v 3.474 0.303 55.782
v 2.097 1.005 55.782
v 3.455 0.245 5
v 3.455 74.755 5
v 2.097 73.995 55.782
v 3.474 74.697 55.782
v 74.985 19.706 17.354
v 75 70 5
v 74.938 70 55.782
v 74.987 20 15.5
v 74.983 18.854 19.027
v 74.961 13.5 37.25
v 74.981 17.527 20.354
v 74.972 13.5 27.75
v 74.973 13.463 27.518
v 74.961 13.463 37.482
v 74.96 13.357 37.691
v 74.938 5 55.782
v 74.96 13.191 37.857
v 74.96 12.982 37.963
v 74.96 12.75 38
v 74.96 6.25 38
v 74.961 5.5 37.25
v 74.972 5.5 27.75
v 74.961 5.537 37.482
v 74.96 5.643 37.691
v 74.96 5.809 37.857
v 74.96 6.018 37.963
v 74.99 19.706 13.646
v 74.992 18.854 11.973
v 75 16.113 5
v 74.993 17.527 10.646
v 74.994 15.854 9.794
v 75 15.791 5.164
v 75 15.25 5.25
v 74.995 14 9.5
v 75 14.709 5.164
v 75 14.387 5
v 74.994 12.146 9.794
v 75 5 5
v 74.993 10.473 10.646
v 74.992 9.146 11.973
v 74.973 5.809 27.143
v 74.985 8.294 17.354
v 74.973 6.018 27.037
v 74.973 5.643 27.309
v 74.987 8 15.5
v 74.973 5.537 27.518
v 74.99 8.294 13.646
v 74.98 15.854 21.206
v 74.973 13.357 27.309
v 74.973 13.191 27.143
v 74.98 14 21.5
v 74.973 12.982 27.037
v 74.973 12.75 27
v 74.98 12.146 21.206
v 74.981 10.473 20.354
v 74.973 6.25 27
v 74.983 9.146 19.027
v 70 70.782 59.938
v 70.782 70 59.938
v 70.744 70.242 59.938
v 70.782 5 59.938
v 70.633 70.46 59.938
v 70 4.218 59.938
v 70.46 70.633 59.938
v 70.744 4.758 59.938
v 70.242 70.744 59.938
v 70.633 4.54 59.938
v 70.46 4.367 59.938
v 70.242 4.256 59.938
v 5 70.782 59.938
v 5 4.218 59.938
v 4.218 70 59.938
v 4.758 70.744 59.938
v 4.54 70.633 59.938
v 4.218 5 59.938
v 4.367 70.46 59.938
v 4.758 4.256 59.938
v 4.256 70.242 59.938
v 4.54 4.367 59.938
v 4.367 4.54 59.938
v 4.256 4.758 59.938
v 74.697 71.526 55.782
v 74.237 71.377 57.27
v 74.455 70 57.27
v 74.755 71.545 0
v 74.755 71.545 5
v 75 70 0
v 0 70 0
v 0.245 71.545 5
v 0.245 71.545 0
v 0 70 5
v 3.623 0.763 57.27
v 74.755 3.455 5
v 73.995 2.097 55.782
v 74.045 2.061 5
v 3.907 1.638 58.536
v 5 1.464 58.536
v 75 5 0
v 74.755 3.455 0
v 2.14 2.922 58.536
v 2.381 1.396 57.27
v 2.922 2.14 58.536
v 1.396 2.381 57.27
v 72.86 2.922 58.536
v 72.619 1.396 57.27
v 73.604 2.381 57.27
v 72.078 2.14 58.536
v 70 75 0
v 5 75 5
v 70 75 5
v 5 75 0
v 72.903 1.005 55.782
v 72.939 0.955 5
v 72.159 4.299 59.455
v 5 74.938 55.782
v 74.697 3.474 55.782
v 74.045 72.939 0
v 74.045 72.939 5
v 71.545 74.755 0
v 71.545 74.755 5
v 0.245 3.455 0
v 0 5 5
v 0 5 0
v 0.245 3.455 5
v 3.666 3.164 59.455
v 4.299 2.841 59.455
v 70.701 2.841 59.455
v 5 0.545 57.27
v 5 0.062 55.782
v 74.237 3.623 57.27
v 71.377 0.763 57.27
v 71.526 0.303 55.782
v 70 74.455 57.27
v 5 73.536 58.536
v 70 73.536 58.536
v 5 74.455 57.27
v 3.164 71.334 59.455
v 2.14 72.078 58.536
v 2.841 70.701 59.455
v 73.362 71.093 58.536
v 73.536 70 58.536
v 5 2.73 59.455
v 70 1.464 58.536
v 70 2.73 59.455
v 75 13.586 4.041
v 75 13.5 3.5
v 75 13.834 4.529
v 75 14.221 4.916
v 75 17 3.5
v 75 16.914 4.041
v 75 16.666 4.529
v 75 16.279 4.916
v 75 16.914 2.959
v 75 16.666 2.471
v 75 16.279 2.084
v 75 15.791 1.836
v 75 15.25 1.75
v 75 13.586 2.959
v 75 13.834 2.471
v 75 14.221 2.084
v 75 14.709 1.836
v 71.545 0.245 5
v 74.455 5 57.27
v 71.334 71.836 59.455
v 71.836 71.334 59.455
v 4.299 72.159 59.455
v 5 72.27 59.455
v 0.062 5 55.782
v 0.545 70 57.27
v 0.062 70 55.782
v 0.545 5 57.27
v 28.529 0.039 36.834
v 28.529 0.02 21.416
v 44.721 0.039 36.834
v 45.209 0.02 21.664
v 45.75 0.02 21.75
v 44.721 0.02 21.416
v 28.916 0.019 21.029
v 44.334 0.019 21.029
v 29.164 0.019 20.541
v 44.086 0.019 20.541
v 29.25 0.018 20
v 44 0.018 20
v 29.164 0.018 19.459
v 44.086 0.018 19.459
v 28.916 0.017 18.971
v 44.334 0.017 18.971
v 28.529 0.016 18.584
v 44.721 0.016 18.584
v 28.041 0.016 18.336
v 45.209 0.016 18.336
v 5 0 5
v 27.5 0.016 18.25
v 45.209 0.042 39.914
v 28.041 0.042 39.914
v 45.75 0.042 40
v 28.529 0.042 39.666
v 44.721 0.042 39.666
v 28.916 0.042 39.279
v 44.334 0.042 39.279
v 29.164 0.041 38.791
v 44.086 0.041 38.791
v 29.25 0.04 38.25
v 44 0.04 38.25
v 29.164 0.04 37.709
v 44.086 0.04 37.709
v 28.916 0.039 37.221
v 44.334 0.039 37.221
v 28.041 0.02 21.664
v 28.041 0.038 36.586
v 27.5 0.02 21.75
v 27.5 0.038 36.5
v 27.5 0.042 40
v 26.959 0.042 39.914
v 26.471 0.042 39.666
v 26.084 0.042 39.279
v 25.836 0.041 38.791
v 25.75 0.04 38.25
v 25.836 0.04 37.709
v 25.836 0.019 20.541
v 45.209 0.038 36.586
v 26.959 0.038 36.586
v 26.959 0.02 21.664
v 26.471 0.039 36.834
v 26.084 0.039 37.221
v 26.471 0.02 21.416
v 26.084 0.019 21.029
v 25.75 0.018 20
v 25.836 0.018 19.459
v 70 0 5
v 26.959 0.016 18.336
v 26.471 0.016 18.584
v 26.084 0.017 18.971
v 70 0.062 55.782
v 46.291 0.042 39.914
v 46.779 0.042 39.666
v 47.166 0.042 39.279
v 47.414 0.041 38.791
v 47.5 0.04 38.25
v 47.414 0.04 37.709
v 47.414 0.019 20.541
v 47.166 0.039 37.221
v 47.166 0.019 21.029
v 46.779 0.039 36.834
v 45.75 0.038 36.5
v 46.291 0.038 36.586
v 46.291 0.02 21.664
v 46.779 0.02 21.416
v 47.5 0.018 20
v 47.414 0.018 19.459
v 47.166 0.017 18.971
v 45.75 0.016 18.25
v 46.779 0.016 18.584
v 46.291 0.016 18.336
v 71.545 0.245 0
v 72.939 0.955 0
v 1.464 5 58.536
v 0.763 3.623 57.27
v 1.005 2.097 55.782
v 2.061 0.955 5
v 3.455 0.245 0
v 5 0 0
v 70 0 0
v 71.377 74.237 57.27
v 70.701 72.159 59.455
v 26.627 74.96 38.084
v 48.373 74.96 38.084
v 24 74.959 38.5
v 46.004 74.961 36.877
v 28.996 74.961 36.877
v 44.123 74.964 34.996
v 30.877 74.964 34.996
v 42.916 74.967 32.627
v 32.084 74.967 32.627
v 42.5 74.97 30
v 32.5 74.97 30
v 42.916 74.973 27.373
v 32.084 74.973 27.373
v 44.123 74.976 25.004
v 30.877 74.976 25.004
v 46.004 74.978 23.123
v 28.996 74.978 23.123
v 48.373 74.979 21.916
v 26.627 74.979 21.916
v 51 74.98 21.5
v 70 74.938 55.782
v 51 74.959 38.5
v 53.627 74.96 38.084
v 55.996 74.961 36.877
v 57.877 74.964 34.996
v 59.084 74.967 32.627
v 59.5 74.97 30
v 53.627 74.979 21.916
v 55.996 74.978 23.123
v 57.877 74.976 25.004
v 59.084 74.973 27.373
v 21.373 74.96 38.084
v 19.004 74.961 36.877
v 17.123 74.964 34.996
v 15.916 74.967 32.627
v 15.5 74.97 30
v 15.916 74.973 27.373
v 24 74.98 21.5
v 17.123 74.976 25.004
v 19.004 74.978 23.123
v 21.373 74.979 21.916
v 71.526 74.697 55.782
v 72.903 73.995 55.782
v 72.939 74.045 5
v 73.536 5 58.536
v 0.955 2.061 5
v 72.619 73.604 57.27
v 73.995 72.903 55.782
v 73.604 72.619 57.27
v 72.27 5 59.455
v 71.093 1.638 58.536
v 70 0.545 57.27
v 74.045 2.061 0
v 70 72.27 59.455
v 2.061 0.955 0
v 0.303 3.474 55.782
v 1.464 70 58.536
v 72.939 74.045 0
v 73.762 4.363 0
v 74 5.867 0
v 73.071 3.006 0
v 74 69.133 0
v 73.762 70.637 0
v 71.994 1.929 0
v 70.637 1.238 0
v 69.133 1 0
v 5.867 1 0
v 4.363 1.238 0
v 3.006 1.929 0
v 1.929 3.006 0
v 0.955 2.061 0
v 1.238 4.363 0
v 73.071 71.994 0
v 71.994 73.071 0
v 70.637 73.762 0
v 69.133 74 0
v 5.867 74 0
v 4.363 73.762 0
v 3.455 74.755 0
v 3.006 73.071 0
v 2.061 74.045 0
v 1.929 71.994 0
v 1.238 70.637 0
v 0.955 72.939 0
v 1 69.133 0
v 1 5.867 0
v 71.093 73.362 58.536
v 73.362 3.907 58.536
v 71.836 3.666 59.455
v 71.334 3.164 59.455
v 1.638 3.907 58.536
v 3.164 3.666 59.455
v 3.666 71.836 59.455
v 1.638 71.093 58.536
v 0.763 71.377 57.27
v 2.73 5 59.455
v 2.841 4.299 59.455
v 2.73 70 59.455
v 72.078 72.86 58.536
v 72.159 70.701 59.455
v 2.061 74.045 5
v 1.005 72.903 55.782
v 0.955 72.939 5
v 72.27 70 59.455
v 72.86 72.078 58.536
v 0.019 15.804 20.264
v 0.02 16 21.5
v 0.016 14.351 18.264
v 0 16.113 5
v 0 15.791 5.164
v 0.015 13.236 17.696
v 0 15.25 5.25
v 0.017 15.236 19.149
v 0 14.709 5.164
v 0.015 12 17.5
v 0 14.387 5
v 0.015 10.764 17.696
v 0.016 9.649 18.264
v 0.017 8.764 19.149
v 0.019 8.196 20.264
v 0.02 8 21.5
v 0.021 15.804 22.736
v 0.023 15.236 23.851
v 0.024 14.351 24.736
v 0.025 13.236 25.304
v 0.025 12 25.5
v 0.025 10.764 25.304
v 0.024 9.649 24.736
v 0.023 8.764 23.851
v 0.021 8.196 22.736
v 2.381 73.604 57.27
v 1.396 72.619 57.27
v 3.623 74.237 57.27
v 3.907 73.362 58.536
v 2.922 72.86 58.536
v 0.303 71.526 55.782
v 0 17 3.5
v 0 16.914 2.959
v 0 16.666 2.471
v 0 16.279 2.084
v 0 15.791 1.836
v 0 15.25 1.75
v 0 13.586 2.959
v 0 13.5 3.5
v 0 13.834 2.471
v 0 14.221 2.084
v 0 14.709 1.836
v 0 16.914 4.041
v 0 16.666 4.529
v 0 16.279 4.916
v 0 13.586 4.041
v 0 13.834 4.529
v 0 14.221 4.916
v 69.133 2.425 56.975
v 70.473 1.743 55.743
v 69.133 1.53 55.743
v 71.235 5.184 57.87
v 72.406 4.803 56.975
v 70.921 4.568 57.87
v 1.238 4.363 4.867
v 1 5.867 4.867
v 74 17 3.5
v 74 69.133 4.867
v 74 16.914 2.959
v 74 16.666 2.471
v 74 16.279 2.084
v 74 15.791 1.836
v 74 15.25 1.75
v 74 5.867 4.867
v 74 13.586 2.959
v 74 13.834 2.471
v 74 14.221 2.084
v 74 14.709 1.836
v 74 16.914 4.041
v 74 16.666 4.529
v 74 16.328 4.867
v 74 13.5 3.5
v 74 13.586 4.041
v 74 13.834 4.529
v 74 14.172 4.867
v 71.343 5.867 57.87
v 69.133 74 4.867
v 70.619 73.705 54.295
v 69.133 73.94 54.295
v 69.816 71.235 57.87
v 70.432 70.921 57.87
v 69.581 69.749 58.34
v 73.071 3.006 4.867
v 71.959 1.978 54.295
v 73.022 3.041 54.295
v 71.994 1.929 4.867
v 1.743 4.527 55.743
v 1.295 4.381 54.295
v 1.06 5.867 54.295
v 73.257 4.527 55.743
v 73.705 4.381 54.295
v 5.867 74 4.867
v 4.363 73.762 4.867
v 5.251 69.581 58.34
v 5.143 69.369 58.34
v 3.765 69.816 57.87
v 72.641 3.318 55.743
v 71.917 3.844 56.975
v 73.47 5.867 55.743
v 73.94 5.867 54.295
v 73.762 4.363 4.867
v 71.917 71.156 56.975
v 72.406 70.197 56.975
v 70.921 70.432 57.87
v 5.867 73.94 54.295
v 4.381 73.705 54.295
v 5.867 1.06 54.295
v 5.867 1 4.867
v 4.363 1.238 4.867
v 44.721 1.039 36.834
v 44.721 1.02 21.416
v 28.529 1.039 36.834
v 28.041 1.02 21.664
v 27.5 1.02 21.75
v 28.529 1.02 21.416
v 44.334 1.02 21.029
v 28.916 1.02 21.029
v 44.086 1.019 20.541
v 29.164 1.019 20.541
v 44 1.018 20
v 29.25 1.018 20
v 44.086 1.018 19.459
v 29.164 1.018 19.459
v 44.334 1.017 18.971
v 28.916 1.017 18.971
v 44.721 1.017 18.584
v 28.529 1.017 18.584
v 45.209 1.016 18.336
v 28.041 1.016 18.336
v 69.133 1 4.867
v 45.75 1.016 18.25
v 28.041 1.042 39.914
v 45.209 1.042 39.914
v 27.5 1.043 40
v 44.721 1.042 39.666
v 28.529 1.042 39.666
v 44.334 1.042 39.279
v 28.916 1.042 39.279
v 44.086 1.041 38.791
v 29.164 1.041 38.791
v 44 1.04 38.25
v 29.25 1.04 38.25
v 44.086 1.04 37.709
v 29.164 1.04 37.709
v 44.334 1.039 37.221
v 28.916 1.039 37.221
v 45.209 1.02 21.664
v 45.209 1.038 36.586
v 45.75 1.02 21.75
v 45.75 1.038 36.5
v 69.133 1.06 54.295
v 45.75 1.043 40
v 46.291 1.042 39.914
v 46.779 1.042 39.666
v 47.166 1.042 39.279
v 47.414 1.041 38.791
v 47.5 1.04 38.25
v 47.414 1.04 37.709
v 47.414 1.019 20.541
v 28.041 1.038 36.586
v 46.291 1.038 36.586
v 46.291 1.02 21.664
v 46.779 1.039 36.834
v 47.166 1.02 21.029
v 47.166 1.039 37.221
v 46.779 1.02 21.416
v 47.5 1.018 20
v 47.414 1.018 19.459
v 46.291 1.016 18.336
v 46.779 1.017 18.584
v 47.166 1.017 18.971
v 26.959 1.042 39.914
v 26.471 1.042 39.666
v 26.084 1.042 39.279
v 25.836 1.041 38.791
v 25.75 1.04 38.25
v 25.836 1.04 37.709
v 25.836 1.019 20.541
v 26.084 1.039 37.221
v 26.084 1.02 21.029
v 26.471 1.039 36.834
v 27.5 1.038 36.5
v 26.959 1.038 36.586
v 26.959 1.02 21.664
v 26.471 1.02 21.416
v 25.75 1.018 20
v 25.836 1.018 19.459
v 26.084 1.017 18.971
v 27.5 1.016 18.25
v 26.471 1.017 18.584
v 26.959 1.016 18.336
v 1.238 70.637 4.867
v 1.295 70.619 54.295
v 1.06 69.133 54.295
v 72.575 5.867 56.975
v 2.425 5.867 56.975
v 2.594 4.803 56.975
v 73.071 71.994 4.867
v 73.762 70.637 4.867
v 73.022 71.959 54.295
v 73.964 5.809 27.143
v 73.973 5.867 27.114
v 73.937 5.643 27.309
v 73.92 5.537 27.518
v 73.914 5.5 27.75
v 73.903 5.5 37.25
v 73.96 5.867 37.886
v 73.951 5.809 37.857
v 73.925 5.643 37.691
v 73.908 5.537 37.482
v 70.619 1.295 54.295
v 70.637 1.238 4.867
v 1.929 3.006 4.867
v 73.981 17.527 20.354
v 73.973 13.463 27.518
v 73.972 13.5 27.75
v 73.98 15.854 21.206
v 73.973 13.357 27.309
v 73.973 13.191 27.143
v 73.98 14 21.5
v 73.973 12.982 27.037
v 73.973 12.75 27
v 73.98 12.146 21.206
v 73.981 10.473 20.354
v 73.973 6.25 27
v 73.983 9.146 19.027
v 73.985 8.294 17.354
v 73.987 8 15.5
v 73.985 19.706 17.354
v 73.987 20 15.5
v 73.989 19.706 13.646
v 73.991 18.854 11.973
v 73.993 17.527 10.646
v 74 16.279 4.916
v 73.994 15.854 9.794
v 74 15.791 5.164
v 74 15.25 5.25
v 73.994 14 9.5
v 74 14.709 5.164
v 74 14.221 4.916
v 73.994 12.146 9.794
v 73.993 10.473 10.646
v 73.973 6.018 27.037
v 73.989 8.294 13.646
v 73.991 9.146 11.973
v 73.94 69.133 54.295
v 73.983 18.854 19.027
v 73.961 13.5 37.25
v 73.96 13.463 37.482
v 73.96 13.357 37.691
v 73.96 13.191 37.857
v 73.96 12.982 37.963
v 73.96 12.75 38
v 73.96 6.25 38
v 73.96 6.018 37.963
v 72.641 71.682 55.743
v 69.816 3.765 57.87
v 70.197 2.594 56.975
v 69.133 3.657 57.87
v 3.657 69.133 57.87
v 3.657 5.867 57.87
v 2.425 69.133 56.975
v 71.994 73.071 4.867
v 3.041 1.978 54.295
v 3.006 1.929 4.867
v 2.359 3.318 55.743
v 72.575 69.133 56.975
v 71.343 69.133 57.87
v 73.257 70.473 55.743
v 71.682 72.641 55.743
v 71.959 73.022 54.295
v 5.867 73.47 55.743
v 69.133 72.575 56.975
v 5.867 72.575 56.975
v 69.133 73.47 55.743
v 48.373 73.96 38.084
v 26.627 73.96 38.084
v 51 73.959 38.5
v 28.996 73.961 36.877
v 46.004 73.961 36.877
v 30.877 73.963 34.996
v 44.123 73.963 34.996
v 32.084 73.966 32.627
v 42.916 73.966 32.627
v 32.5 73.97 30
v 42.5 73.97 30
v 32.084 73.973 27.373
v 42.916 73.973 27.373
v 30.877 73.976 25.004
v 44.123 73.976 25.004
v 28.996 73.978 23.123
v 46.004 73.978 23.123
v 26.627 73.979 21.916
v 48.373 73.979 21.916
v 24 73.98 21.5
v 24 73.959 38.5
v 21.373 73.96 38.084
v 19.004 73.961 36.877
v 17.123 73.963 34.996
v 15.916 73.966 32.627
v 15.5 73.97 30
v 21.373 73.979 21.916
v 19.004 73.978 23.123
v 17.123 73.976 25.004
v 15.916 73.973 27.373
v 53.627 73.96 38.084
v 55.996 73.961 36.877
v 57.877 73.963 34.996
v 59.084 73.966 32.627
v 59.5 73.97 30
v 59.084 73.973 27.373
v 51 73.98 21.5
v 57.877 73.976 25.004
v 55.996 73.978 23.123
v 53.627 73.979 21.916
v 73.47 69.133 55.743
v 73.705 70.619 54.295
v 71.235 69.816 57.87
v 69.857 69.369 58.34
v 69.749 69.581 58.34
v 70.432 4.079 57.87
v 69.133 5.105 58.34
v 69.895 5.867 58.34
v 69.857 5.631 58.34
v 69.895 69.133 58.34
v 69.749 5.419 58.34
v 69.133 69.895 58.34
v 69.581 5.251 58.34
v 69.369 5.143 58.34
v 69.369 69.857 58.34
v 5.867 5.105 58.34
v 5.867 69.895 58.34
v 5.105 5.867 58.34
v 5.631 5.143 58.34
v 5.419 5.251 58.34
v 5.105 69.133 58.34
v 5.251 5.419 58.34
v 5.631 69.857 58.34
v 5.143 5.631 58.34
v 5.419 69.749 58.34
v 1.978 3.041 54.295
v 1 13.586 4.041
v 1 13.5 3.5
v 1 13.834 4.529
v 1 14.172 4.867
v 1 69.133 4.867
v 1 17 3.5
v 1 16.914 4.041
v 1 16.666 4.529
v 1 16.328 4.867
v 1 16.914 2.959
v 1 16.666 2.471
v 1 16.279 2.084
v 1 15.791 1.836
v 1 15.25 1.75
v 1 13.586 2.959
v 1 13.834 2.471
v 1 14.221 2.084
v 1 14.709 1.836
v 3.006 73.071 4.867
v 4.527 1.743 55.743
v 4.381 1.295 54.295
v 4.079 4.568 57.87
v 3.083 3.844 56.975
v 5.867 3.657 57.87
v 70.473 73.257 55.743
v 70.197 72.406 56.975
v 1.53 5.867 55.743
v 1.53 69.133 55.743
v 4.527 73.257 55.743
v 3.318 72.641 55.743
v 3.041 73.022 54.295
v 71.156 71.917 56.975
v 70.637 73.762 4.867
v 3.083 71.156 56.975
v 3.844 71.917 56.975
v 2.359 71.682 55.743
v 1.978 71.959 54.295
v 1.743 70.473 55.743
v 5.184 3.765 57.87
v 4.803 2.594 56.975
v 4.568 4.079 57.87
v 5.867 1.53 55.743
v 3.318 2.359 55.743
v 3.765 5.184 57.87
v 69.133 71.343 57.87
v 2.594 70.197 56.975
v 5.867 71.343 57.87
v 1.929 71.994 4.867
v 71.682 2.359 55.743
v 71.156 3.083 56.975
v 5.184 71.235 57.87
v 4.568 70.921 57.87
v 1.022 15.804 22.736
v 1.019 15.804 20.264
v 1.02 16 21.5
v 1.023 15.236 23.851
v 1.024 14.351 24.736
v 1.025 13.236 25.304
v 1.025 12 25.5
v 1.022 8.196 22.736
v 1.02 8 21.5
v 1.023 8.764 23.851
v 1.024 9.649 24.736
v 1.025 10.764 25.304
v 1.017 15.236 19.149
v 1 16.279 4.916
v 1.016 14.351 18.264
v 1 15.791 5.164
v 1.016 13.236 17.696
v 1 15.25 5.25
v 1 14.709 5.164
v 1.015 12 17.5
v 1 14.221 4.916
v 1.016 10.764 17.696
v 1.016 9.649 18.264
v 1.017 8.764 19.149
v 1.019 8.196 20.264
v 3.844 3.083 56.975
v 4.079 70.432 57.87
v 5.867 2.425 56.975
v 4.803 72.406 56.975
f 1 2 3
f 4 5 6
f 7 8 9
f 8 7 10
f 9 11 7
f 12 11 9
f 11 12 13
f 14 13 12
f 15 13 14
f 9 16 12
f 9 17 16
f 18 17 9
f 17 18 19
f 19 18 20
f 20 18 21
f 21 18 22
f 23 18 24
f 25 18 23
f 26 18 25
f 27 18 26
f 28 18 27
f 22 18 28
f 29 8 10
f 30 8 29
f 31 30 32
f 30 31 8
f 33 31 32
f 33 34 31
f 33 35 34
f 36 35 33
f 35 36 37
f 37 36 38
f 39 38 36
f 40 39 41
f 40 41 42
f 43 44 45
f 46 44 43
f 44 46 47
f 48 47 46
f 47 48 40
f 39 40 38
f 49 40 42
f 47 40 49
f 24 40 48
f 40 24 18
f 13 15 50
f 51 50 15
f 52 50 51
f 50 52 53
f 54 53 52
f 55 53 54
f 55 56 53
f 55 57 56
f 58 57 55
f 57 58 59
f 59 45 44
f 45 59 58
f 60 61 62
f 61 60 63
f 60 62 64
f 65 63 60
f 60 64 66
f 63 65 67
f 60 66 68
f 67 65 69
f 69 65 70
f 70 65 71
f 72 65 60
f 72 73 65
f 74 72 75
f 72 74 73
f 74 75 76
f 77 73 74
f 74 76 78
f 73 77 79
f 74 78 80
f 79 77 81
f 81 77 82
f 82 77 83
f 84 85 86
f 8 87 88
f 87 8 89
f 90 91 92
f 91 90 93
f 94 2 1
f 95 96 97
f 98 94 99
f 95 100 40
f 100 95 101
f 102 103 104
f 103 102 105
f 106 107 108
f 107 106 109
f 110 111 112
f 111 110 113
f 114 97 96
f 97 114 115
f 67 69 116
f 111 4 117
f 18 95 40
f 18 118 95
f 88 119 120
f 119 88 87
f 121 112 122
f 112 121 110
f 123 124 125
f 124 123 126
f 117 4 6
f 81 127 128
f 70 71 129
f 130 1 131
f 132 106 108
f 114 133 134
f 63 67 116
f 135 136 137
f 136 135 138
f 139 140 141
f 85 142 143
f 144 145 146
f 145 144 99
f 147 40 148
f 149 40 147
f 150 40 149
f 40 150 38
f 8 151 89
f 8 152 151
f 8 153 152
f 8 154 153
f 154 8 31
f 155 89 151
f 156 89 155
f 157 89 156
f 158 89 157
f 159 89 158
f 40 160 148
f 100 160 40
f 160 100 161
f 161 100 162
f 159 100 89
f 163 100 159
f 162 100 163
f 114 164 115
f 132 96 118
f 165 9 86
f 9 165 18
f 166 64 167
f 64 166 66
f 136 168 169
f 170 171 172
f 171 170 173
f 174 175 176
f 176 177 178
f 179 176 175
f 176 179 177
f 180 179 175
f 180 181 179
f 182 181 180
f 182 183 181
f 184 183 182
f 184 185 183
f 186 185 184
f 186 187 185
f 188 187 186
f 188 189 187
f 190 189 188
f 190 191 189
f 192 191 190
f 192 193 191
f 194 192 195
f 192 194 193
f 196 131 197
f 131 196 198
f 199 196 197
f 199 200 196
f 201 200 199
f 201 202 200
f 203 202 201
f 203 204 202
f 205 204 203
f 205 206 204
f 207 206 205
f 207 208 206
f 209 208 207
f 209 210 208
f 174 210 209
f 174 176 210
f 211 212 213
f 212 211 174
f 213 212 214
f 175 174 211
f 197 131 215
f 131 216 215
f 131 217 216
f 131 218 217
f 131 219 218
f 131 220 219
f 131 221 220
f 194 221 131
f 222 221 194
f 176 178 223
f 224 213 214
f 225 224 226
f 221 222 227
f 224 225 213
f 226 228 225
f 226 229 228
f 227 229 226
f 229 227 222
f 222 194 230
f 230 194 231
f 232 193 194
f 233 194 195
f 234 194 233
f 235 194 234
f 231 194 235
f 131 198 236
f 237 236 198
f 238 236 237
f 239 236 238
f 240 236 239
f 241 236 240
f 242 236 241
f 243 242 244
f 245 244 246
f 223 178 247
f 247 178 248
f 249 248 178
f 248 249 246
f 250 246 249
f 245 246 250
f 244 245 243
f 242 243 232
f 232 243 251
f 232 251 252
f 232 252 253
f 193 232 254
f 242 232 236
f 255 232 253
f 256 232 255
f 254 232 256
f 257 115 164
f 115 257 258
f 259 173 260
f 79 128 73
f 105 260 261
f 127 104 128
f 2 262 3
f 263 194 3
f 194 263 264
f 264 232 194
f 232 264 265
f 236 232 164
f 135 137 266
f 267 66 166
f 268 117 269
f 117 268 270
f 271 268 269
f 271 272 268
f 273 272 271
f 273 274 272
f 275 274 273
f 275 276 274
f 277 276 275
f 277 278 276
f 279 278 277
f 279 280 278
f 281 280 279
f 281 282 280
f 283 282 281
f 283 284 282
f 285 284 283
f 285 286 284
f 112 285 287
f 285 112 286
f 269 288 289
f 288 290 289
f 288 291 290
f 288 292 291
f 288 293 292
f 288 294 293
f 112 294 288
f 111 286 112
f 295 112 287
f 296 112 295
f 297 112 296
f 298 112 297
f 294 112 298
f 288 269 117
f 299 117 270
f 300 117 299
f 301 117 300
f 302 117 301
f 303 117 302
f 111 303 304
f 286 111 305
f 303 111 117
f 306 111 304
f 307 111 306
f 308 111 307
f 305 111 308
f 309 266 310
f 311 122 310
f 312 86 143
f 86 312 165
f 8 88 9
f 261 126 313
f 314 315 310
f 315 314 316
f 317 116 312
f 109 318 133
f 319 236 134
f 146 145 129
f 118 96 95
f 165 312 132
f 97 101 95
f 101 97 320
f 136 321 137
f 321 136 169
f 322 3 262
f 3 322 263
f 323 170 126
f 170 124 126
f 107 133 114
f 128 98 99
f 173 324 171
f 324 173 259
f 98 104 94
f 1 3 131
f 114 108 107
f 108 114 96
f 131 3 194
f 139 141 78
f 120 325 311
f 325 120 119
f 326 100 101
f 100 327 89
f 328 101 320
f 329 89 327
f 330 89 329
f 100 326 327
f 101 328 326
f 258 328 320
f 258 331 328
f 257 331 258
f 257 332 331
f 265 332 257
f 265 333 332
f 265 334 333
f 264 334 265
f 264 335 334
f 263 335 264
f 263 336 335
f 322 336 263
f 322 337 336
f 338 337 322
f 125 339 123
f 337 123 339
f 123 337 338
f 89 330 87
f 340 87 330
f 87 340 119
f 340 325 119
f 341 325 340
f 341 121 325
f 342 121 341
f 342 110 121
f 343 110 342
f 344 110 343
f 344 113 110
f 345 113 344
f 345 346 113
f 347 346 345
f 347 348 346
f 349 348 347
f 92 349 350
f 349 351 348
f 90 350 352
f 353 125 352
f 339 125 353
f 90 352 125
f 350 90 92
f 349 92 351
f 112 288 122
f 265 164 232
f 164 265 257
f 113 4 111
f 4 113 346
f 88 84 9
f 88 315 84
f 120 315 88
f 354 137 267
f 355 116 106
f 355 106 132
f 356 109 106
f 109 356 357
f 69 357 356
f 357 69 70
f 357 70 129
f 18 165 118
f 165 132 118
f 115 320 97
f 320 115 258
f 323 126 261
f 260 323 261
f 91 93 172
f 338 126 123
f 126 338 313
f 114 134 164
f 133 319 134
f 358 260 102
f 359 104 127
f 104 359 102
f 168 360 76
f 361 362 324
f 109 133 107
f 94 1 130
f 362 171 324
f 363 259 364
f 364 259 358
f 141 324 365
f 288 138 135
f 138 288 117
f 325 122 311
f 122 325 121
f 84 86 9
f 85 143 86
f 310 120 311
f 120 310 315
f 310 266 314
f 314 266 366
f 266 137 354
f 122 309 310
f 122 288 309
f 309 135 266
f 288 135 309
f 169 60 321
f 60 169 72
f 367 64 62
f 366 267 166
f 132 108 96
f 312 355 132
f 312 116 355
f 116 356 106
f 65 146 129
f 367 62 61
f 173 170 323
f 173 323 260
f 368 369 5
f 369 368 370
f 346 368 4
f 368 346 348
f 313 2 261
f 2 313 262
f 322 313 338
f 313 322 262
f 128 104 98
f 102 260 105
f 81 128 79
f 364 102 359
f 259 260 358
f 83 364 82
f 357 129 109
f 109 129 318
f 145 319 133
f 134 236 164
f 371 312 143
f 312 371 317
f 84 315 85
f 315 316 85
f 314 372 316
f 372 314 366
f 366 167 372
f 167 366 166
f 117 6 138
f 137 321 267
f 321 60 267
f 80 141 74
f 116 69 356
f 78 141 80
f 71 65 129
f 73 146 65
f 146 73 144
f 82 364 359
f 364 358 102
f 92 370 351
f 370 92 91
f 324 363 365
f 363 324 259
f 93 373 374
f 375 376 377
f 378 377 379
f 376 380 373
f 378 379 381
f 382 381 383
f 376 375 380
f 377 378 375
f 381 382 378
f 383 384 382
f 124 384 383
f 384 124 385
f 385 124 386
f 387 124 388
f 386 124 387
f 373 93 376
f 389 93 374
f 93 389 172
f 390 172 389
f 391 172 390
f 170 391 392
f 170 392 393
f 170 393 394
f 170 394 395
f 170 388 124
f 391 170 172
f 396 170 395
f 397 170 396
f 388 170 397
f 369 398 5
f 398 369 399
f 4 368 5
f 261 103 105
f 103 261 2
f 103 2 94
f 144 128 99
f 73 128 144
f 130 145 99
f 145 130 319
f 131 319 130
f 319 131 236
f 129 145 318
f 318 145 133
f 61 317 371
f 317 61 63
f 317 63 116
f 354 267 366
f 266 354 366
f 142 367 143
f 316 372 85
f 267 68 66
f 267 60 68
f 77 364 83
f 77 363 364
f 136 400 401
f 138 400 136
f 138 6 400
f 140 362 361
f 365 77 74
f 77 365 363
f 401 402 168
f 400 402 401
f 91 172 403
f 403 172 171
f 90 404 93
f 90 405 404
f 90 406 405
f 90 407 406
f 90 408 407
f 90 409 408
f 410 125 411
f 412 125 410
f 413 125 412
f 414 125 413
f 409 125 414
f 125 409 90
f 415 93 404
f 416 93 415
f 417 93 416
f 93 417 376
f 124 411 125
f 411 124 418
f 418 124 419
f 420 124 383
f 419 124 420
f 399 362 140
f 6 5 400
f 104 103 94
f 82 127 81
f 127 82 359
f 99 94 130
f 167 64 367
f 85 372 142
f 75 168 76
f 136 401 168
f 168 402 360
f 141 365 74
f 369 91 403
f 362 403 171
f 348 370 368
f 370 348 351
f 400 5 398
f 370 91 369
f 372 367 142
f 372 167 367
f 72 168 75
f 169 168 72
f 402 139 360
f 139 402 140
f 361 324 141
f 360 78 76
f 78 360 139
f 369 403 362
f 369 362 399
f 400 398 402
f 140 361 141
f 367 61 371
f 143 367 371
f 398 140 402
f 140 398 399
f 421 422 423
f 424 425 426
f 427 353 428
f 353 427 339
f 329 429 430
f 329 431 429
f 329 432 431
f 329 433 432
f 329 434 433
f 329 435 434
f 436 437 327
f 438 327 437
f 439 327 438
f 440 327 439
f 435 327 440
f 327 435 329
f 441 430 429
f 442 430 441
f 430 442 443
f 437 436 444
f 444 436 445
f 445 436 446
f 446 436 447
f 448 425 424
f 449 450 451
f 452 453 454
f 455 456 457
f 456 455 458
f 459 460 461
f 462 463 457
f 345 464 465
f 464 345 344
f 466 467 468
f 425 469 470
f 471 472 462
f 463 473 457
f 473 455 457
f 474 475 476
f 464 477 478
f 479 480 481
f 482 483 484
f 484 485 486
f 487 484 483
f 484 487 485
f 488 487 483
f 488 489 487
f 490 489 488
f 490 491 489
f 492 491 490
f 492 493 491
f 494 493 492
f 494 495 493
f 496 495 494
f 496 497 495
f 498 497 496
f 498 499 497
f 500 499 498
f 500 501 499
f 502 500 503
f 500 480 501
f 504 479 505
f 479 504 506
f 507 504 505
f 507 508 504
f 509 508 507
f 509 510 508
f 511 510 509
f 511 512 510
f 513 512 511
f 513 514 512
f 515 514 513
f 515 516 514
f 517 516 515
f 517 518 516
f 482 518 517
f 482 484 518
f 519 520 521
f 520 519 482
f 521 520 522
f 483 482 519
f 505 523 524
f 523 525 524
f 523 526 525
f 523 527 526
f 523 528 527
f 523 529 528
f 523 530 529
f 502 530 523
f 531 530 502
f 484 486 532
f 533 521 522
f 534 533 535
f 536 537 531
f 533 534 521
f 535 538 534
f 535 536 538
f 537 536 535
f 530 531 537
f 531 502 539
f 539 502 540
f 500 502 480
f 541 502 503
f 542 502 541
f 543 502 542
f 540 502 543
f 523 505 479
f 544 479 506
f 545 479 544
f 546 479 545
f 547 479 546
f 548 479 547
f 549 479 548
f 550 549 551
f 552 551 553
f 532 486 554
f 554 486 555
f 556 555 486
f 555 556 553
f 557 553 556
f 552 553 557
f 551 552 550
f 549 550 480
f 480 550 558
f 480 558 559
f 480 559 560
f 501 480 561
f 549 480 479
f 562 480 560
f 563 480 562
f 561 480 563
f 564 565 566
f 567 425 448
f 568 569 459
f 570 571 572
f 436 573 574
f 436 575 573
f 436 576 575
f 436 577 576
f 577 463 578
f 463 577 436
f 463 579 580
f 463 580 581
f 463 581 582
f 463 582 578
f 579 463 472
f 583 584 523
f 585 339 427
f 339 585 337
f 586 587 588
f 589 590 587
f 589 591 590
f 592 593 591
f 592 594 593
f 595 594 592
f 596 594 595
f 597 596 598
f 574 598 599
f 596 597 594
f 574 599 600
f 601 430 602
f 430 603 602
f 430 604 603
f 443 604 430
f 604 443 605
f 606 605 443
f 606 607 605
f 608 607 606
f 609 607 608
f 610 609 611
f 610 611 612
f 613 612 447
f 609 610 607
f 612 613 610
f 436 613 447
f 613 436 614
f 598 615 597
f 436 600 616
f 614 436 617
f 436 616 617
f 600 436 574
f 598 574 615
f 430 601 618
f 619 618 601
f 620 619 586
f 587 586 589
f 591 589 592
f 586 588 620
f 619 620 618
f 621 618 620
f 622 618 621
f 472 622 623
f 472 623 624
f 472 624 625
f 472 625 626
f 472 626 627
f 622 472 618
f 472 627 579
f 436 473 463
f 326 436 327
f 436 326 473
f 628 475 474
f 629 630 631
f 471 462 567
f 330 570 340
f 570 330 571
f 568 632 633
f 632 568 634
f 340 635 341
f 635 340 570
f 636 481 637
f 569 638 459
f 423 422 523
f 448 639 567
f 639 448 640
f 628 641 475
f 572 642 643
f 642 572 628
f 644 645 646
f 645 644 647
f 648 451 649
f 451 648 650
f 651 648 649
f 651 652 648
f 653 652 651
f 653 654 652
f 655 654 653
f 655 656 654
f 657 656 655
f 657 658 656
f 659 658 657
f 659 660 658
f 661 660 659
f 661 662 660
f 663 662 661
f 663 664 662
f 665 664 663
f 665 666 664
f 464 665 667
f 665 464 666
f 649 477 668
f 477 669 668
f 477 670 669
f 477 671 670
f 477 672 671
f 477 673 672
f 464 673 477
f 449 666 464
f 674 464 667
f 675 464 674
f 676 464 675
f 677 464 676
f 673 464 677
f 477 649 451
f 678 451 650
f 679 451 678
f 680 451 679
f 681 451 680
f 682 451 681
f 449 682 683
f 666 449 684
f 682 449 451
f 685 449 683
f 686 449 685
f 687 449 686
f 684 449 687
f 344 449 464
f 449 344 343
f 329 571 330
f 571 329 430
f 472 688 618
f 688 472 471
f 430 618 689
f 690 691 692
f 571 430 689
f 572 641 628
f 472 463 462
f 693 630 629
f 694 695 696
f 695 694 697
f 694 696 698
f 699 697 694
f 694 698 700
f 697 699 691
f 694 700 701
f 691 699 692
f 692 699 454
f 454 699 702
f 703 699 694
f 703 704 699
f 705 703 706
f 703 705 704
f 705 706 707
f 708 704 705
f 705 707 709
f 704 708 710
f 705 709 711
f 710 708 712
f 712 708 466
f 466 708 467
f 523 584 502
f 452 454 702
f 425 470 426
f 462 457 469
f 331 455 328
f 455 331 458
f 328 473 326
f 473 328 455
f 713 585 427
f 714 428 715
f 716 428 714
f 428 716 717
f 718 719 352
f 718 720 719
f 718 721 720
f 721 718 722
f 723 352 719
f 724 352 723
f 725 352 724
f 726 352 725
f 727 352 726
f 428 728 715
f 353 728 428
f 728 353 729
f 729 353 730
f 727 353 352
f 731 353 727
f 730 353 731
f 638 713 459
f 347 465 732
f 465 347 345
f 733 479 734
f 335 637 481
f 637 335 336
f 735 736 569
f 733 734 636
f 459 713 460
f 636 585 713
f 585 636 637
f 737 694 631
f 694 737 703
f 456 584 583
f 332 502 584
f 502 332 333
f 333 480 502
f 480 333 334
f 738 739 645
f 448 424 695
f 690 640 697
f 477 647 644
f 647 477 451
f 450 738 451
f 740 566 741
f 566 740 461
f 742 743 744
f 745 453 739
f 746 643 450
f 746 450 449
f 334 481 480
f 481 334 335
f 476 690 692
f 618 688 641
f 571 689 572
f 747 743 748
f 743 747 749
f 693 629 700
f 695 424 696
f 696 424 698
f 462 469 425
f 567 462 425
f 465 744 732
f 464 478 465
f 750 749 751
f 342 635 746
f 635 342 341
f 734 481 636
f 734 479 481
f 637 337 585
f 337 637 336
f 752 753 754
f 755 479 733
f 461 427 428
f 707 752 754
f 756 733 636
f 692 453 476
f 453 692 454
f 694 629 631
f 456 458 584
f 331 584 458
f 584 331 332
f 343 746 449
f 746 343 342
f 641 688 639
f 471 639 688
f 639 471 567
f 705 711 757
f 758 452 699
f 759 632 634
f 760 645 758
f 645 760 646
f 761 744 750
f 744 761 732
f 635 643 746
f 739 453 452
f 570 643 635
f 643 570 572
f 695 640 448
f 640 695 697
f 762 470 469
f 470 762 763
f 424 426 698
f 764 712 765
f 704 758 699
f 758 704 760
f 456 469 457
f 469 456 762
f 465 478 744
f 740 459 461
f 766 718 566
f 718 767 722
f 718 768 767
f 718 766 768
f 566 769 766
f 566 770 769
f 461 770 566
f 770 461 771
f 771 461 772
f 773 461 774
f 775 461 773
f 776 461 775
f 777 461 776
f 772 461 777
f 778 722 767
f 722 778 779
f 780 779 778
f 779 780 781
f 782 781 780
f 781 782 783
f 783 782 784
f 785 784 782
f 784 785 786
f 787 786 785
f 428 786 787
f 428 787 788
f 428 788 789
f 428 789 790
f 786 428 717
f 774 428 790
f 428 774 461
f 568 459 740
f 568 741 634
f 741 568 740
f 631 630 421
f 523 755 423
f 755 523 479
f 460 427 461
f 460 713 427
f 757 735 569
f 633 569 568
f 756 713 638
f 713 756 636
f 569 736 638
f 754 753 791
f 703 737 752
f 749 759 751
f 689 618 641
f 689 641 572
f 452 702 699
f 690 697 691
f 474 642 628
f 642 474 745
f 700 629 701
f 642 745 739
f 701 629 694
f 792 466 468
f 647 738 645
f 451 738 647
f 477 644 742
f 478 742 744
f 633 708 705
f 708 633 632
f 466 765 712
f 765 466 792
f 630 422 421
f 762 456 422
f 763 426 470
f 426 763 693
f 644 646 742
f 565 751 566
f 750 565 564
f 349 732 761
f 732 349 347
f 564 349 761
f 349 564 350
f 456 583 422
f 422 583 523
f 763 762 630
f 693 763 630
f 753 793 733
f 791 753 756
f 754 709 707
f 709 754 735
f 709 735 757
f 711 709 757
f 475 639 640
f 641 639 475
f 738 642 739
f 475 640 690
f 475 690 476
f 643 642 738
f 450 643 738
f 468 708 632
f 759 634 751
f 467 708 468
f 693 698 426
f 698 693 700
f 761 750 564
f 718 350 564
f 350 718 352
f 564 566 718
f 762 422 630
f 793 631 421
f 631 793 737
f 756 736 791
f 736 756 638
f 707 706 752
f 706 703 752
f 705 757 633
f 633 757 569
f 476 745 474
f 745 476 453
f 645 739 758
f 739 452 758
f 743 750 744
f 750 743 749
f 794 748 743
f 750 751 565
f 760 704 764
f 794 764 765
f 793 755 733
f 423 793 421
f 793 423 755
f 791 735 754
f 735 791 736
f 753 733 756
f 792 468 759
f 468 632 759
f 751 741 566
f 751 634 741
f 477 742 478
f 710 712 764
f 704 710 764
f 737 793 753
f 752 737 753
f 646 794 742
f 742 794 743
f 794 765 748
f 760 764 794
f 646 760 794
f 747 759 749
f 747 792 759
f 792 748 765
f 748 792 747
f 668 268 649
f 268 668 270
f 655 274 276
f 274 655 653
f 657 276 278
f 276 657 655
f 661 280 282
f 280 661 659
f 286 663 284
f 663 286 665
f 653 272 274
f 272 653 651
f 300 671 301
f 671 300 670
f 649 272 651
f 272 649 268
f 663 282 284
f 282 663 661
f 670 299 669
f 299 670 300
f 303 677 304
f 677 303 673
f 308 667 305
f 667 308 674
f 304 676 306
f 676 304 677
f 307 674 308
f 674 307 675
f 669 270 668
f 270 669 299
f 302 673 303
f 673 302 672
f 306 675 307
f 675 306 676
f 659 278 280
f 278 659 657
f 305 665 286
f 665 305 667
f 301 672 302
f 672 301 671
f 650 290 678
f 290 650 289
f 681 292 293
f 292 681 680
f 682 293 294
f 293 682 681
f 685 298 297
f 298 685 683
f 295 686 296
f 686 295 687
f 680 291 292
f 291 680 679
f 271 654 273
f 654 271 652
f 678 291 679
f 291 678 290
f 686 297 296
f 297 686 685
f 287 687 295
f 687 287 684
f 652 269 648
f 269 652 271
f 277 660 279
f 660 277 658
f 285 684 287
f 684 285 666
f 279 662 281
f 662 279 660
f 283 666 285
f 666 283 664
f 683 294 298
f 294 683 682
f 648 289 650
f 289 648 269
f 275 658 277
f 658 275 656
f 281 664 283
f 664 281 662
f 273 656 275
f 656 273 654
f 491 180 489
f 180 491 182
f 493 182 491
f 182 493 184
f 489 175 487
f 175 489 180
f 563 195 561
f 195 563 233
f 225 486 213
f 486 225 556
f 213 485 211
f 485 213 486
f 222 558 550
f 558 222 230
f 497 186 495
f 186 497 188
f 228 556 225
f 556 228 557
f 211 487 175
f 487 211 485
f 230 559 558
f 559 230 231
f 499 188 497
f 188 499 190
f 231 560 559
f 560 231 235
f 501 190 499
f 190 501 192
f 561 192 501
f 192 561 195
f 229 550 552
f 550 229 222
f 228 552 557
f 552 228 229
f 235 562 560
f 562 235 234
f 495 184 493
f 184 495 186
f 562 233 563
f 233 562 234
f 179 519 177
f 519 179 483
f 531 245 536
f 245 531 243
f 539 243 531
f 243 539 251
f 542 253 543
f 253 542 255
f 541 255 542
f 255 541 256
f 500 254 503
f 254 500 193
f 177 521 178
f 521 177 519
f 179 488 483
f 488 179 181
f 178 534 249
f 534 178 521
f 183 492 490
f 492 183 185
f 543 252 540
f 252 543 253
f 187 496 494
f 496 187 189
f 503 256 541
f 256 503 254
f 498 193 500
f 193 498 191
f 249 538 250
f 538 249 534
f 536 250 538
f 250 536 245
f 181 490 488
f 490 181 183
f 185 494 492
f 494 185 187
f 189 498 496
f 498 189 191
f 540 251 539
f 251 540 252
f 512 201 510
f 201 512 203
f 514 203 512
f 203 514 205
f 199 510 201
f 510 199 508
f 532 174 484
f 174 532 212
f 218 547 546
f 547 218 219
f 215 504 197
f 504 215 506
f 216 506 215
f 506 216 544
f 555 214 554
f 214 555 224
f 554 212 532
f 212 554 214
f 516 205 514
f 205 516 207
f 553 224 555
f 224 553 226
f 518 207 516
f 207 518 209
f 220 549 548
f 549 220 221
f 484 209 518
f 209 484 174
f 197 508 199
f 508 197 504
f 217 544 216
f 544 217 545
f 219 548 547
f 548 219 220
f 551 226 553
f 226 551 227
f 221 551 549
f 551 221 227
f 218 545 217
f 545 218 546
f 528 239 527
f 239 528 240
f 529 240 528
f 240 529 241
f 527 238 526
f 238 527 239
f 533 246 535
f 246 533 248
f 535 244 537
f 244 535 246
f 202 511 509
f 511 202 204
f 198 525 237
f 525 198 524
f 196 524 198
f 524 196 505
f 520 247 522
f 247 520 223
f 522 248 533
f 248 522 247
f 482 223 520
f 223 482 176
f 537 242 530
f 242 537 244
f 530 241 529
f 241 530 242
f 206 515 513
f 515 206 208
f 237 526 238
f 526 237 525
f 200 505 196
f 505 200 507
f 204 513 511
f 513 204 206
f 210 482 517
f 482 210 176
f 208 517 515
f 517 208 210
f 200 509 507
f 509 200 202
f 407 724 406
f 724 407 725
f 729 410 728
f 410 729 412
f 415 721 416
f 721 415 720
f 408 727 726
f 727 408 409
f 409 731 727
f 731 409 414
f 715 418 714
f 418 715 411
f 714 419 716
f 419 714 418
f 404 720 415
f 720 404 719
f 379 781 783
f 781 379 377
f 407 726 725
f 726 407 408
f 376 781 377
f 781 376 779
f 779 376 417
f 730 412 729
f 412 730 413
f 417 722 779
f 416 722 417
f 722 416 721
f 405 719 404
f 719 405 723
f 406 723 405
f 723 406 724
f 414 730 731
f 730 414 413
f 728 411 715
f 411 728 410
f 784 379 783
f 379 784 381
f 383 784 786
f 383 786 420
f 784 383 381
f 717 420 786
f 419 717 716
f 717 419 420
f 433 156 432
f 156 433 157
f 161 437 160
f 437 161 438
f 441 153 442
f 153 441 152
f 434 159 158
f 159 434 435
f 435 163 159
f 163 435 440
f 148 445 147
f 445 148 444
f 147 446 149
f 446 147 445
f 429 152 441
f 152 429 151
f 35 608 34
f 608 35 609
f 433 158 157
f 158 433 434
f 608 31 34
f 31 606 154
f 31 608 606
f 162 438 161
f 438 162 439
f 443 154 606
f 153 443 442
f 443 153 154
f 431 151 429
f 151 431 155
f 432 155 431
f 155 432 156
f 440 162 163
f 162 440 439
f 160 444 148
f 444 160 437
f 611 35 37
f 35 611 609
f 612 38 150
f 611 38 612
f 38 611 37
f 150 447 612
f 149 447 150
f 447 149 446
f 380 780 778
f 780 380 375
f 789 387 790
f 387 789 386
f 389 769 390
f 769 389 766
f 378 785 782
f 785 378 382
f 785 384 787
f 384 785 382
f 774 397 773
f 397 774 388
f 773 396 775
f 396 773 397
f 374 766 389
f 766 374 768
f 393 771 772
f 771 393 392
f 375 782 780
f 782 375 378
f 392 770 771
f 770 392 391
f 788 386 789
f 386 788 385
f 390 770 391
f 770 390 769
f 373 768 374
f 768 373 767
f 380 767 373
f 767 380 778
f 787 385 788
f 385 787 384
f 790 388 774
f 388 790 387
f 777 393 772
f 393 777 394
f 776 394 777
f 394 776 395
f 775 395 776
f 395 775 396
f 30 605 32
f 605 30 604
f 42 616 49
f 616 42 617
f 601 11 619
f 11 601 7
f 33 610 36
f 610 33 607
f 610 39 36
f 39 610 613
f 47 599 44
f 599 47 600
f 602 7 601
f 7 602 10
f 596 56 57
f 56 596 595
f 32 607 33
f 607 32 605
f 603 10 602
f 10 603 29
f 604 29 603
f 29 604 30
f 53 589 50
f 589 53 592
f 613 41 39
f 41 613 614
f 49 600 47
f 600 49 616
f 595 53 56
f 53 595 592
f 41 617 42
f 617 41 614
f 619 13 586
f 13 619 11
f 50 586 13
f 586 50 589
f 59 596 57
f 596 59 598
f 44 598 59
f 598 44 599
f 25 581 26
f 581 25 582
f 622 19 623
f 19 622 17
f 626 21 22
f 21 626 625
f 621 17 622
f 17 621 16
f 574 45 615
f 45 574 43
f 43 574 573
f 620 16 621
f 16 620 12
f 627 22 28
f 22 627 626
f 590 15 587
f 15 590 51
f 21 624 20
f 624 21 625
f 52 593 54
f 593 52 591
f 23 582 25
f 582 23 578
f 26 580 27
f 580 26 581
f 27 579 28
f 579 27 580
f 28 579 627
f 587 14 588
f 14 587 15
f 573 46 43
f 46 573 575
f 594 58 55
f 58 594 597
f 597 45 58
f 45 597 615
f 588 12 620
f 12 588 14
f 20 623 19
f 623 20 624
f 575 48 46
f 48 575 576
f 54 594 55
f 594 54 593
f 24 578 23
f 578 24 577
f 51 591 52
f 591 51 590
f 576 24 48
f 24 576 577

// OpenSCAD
//Body

//variables
xBody = 75;
yBody = xBody;
zBody = 60;

rSpheres = 5;

grosorBody = 2;
scaleFactor = (100-(2*100)/75)/100;

//LeftSideHoles
dLeftSideHoles = 17;
diffLeftSideHoles = 10;
xLeftSideHolesPosition = xBody/2-(dLeftSideHoles*2+diffLeftSideHoles)/2+dLeftSideHoles/2;

//RightSideHoles
dRightSideHoles = 3.5;
diffRightSideHoles = 16.5;
xRightSideHolesPosition = xBody/2-(dRightSideHoles*2+diffRightSideHoles)/2+dRightSideHoles/2;
zRightSideHolesPosition = zBody/2-(dRightSideHoles*2+diffRightSideHoles)/2+dRightSideHoles/2;


//Small Frontand Back Holes
dSmallHoles = dRightSideHoles;
ySmallHoles = 13.5 + dSmallHoles/2;
zSmallHoles = 1.75 + dSmallHoles/2;

//BackSide hole
dBackSideHole = 8;
yBackSideHole = 8 + dBackSideHole/2;
zBackSideHole = 17.5 + dBackSideHole/2;

//FrontSide hole
dFrontSideHole = 12;
yFrontSideHole = 8 + dFrontSideHole/2;
zFrontSideHole = 9.5 + dFrontSideHole/2;

//Front Square
yFrontSquare = 8;
zFrontSquare = 11;
dFrontSquareCorner = 1.5;
yPostionFrontSquare = 5.5;
zPostionFrontSquare = 38;


//modules

module body(){
    difference(){
        bodyBase();
        translate([xLeftSideHolesPosition,0,0])
            leftSideHoles();
        translate([xRightSideHolesPosition,0,zRightSideHolesPosition])
            rightSideHoles();
        smallHoles();
        backSideHole();
        frontSideHole();
        frontSquareHole();
    }        
}

module bodyBase(){
    difference(){
        bodyBaseSolid();
        translate([grosorBody/2, grosorBody/2,0])
            scale([scaleFactor,scaleFactor,scaleFactor])
                bodyBaseSolid();
    }
}

module bodyBaseSolid(){
    hull(){
        translate([rSpheres,rSpheres,zBody-rSpheres])
            sphere(r=rSpheres, $fn=20);
        translate([xBody-rSpheres,rSpheres,zBody-rSpheres])
            sphere(r=rSpheres, $fn=20);
        translate([rSpheres,yBody-rSpheres,zBody-rSpheres])
            sphere(r=rSpheres, $fn=20);
        translate([xBody-rSpheres,yBody-rSpheres,zBody-rSpheres])
            sphere(r=rSpheres, $fn=20);
        translate([rSpheres,rSpheres,0])
            cylinder(r=rSpheres, h=5, $fn=20);
        translate([xBody-rSpheres,rSpheres,0])
            cylinder(r=rSpheres, h=5, $fn=20);
        translate([rSpheres,yBody-rSpheres,0])
            cylinder(r=rSpheres, h=5, $fn=20);
        translate([xBody-rSpheres,yBody-rSpheres,0])
            cylinder(r=rSpheres, h=5, $fn=20);
    }
}

module leftSideHoles(){
    translate([0, yBody,zBody/2])
        rotate([90,0,0])
            cylinder(h=grosorBody*5, d=dLeftSideHoles, center=true, $fn=20);
    translate([dLeftSideHoles+diffLeftSideHoles, yBody,zBody/2])
        rotate([90,0,0])
            cylinder(h=grosorBody*5, d=dLeftSideHoles, center=true, $fn=20);
}

module rightSideHoles(){
    //agujero1
    translate([0, 0,0])
        rotate([90,0,0])
            cylinder(h=grosorBody*5, d=dRightSideHoles, center=true, $fn=20);
    //agujero2
    translate([diffRightSideHoles+dRightSideHoles/2, 0,0])
        rotate([90,0,0])
            cylinder(h=grosorBody*5, d=dRightSideHoles, center=true, $fn=20);
    //agujero3
    translate([0, 0, diffRightSideHoles+dRightSideHoles/2])
        rotate([90,0,0])
            cylinder(h=grosorBody*5, d=dRightSideHoles, center=true, $fn=20);
    //agujero4
    translate([diffRightSideHoles+dRightSideHoles/2, 0,diffRightSideHoles+dRightSideHoles/2])
        rotate([90,0,0])
            cylinder(h=grosorBody*5, d=dRightSideHoles, center=true, $fn=20);
}

module smallHoles(){
    //agujero1
    translate([0, ySmallHoles, zSmallHoles])
        rotate([0,90,0])
            cylinder(h=grosorBody*5, d=dSmallHoles, center=true, $fn=20);
    //agujero2
    translate([xBody, ySmallHoles, zSmallHoles])
        rotate([0,90,0])
            cylinder(h=grosorBody*5, d=dSmallHoles, center=true, $fn=20);
}

module backSideHole(){
    //agujero1
    translate([0, yBackSideHole, zBackSideHole])
        rotate([0,90,0])
            cylinder(h=grosorBody*5, d=dBackSideHole, center=true, $fn=20);
}

module frontSideHole(){
    //agujero1
    translate([xBody, yFrontSideHole, zFrontSideHole])
        rotate([0,90,0])
            cylinder(h=grosorBody*5, d=dFrontSideHole, center=true, $fn=20);
}

module frontSquareHole(){
    hull(){
        //agujero1
        translate([xBody, yPostionFrontSquare+dFrontSquareCorner/2,zPostionFrontSquare-dFrontSquareCorner/2])
            rotate([0,90,0])
                cylinder(h=grosorBody*5, d=dFrontSquareCorner, center=true, $fn=20);
        //agujero2
        translate([xBody, yPostionFrontSquare+yFrontSquare-dFrontSquareCorner/2,zPostionFrontSquare-dFrontSquareCorner/2])
            rotate([0,90,0])
                cylinder(h=grosorBody*5, d=dFrontSquareCorner, center=true, $fn=20);
        //agujero3
        translate([xBody, yPostionFrontSquare+dFrontSquareCorner/2, zPostionFrontSquare-zFrontSquare+dFrontSquareCorner/2])
            rotate([0,90,0])
                cylinder(h=grosorBody*5, d=dFrontSquareCorner, center=true, $fn=20);
        //agujero4
        translate([xBody, yPostionFrontSquare+yFrontSquare-dFrontSquareCorner/2, zPostionFrontSquare-zFrontSquare+dFrontSquareCorner/2])
            rotate([0,90,0])
                cylinder(h=grosorBody*5, d=dFrontSquareCorner, center=true, $fn=20);
    }
}

body();
